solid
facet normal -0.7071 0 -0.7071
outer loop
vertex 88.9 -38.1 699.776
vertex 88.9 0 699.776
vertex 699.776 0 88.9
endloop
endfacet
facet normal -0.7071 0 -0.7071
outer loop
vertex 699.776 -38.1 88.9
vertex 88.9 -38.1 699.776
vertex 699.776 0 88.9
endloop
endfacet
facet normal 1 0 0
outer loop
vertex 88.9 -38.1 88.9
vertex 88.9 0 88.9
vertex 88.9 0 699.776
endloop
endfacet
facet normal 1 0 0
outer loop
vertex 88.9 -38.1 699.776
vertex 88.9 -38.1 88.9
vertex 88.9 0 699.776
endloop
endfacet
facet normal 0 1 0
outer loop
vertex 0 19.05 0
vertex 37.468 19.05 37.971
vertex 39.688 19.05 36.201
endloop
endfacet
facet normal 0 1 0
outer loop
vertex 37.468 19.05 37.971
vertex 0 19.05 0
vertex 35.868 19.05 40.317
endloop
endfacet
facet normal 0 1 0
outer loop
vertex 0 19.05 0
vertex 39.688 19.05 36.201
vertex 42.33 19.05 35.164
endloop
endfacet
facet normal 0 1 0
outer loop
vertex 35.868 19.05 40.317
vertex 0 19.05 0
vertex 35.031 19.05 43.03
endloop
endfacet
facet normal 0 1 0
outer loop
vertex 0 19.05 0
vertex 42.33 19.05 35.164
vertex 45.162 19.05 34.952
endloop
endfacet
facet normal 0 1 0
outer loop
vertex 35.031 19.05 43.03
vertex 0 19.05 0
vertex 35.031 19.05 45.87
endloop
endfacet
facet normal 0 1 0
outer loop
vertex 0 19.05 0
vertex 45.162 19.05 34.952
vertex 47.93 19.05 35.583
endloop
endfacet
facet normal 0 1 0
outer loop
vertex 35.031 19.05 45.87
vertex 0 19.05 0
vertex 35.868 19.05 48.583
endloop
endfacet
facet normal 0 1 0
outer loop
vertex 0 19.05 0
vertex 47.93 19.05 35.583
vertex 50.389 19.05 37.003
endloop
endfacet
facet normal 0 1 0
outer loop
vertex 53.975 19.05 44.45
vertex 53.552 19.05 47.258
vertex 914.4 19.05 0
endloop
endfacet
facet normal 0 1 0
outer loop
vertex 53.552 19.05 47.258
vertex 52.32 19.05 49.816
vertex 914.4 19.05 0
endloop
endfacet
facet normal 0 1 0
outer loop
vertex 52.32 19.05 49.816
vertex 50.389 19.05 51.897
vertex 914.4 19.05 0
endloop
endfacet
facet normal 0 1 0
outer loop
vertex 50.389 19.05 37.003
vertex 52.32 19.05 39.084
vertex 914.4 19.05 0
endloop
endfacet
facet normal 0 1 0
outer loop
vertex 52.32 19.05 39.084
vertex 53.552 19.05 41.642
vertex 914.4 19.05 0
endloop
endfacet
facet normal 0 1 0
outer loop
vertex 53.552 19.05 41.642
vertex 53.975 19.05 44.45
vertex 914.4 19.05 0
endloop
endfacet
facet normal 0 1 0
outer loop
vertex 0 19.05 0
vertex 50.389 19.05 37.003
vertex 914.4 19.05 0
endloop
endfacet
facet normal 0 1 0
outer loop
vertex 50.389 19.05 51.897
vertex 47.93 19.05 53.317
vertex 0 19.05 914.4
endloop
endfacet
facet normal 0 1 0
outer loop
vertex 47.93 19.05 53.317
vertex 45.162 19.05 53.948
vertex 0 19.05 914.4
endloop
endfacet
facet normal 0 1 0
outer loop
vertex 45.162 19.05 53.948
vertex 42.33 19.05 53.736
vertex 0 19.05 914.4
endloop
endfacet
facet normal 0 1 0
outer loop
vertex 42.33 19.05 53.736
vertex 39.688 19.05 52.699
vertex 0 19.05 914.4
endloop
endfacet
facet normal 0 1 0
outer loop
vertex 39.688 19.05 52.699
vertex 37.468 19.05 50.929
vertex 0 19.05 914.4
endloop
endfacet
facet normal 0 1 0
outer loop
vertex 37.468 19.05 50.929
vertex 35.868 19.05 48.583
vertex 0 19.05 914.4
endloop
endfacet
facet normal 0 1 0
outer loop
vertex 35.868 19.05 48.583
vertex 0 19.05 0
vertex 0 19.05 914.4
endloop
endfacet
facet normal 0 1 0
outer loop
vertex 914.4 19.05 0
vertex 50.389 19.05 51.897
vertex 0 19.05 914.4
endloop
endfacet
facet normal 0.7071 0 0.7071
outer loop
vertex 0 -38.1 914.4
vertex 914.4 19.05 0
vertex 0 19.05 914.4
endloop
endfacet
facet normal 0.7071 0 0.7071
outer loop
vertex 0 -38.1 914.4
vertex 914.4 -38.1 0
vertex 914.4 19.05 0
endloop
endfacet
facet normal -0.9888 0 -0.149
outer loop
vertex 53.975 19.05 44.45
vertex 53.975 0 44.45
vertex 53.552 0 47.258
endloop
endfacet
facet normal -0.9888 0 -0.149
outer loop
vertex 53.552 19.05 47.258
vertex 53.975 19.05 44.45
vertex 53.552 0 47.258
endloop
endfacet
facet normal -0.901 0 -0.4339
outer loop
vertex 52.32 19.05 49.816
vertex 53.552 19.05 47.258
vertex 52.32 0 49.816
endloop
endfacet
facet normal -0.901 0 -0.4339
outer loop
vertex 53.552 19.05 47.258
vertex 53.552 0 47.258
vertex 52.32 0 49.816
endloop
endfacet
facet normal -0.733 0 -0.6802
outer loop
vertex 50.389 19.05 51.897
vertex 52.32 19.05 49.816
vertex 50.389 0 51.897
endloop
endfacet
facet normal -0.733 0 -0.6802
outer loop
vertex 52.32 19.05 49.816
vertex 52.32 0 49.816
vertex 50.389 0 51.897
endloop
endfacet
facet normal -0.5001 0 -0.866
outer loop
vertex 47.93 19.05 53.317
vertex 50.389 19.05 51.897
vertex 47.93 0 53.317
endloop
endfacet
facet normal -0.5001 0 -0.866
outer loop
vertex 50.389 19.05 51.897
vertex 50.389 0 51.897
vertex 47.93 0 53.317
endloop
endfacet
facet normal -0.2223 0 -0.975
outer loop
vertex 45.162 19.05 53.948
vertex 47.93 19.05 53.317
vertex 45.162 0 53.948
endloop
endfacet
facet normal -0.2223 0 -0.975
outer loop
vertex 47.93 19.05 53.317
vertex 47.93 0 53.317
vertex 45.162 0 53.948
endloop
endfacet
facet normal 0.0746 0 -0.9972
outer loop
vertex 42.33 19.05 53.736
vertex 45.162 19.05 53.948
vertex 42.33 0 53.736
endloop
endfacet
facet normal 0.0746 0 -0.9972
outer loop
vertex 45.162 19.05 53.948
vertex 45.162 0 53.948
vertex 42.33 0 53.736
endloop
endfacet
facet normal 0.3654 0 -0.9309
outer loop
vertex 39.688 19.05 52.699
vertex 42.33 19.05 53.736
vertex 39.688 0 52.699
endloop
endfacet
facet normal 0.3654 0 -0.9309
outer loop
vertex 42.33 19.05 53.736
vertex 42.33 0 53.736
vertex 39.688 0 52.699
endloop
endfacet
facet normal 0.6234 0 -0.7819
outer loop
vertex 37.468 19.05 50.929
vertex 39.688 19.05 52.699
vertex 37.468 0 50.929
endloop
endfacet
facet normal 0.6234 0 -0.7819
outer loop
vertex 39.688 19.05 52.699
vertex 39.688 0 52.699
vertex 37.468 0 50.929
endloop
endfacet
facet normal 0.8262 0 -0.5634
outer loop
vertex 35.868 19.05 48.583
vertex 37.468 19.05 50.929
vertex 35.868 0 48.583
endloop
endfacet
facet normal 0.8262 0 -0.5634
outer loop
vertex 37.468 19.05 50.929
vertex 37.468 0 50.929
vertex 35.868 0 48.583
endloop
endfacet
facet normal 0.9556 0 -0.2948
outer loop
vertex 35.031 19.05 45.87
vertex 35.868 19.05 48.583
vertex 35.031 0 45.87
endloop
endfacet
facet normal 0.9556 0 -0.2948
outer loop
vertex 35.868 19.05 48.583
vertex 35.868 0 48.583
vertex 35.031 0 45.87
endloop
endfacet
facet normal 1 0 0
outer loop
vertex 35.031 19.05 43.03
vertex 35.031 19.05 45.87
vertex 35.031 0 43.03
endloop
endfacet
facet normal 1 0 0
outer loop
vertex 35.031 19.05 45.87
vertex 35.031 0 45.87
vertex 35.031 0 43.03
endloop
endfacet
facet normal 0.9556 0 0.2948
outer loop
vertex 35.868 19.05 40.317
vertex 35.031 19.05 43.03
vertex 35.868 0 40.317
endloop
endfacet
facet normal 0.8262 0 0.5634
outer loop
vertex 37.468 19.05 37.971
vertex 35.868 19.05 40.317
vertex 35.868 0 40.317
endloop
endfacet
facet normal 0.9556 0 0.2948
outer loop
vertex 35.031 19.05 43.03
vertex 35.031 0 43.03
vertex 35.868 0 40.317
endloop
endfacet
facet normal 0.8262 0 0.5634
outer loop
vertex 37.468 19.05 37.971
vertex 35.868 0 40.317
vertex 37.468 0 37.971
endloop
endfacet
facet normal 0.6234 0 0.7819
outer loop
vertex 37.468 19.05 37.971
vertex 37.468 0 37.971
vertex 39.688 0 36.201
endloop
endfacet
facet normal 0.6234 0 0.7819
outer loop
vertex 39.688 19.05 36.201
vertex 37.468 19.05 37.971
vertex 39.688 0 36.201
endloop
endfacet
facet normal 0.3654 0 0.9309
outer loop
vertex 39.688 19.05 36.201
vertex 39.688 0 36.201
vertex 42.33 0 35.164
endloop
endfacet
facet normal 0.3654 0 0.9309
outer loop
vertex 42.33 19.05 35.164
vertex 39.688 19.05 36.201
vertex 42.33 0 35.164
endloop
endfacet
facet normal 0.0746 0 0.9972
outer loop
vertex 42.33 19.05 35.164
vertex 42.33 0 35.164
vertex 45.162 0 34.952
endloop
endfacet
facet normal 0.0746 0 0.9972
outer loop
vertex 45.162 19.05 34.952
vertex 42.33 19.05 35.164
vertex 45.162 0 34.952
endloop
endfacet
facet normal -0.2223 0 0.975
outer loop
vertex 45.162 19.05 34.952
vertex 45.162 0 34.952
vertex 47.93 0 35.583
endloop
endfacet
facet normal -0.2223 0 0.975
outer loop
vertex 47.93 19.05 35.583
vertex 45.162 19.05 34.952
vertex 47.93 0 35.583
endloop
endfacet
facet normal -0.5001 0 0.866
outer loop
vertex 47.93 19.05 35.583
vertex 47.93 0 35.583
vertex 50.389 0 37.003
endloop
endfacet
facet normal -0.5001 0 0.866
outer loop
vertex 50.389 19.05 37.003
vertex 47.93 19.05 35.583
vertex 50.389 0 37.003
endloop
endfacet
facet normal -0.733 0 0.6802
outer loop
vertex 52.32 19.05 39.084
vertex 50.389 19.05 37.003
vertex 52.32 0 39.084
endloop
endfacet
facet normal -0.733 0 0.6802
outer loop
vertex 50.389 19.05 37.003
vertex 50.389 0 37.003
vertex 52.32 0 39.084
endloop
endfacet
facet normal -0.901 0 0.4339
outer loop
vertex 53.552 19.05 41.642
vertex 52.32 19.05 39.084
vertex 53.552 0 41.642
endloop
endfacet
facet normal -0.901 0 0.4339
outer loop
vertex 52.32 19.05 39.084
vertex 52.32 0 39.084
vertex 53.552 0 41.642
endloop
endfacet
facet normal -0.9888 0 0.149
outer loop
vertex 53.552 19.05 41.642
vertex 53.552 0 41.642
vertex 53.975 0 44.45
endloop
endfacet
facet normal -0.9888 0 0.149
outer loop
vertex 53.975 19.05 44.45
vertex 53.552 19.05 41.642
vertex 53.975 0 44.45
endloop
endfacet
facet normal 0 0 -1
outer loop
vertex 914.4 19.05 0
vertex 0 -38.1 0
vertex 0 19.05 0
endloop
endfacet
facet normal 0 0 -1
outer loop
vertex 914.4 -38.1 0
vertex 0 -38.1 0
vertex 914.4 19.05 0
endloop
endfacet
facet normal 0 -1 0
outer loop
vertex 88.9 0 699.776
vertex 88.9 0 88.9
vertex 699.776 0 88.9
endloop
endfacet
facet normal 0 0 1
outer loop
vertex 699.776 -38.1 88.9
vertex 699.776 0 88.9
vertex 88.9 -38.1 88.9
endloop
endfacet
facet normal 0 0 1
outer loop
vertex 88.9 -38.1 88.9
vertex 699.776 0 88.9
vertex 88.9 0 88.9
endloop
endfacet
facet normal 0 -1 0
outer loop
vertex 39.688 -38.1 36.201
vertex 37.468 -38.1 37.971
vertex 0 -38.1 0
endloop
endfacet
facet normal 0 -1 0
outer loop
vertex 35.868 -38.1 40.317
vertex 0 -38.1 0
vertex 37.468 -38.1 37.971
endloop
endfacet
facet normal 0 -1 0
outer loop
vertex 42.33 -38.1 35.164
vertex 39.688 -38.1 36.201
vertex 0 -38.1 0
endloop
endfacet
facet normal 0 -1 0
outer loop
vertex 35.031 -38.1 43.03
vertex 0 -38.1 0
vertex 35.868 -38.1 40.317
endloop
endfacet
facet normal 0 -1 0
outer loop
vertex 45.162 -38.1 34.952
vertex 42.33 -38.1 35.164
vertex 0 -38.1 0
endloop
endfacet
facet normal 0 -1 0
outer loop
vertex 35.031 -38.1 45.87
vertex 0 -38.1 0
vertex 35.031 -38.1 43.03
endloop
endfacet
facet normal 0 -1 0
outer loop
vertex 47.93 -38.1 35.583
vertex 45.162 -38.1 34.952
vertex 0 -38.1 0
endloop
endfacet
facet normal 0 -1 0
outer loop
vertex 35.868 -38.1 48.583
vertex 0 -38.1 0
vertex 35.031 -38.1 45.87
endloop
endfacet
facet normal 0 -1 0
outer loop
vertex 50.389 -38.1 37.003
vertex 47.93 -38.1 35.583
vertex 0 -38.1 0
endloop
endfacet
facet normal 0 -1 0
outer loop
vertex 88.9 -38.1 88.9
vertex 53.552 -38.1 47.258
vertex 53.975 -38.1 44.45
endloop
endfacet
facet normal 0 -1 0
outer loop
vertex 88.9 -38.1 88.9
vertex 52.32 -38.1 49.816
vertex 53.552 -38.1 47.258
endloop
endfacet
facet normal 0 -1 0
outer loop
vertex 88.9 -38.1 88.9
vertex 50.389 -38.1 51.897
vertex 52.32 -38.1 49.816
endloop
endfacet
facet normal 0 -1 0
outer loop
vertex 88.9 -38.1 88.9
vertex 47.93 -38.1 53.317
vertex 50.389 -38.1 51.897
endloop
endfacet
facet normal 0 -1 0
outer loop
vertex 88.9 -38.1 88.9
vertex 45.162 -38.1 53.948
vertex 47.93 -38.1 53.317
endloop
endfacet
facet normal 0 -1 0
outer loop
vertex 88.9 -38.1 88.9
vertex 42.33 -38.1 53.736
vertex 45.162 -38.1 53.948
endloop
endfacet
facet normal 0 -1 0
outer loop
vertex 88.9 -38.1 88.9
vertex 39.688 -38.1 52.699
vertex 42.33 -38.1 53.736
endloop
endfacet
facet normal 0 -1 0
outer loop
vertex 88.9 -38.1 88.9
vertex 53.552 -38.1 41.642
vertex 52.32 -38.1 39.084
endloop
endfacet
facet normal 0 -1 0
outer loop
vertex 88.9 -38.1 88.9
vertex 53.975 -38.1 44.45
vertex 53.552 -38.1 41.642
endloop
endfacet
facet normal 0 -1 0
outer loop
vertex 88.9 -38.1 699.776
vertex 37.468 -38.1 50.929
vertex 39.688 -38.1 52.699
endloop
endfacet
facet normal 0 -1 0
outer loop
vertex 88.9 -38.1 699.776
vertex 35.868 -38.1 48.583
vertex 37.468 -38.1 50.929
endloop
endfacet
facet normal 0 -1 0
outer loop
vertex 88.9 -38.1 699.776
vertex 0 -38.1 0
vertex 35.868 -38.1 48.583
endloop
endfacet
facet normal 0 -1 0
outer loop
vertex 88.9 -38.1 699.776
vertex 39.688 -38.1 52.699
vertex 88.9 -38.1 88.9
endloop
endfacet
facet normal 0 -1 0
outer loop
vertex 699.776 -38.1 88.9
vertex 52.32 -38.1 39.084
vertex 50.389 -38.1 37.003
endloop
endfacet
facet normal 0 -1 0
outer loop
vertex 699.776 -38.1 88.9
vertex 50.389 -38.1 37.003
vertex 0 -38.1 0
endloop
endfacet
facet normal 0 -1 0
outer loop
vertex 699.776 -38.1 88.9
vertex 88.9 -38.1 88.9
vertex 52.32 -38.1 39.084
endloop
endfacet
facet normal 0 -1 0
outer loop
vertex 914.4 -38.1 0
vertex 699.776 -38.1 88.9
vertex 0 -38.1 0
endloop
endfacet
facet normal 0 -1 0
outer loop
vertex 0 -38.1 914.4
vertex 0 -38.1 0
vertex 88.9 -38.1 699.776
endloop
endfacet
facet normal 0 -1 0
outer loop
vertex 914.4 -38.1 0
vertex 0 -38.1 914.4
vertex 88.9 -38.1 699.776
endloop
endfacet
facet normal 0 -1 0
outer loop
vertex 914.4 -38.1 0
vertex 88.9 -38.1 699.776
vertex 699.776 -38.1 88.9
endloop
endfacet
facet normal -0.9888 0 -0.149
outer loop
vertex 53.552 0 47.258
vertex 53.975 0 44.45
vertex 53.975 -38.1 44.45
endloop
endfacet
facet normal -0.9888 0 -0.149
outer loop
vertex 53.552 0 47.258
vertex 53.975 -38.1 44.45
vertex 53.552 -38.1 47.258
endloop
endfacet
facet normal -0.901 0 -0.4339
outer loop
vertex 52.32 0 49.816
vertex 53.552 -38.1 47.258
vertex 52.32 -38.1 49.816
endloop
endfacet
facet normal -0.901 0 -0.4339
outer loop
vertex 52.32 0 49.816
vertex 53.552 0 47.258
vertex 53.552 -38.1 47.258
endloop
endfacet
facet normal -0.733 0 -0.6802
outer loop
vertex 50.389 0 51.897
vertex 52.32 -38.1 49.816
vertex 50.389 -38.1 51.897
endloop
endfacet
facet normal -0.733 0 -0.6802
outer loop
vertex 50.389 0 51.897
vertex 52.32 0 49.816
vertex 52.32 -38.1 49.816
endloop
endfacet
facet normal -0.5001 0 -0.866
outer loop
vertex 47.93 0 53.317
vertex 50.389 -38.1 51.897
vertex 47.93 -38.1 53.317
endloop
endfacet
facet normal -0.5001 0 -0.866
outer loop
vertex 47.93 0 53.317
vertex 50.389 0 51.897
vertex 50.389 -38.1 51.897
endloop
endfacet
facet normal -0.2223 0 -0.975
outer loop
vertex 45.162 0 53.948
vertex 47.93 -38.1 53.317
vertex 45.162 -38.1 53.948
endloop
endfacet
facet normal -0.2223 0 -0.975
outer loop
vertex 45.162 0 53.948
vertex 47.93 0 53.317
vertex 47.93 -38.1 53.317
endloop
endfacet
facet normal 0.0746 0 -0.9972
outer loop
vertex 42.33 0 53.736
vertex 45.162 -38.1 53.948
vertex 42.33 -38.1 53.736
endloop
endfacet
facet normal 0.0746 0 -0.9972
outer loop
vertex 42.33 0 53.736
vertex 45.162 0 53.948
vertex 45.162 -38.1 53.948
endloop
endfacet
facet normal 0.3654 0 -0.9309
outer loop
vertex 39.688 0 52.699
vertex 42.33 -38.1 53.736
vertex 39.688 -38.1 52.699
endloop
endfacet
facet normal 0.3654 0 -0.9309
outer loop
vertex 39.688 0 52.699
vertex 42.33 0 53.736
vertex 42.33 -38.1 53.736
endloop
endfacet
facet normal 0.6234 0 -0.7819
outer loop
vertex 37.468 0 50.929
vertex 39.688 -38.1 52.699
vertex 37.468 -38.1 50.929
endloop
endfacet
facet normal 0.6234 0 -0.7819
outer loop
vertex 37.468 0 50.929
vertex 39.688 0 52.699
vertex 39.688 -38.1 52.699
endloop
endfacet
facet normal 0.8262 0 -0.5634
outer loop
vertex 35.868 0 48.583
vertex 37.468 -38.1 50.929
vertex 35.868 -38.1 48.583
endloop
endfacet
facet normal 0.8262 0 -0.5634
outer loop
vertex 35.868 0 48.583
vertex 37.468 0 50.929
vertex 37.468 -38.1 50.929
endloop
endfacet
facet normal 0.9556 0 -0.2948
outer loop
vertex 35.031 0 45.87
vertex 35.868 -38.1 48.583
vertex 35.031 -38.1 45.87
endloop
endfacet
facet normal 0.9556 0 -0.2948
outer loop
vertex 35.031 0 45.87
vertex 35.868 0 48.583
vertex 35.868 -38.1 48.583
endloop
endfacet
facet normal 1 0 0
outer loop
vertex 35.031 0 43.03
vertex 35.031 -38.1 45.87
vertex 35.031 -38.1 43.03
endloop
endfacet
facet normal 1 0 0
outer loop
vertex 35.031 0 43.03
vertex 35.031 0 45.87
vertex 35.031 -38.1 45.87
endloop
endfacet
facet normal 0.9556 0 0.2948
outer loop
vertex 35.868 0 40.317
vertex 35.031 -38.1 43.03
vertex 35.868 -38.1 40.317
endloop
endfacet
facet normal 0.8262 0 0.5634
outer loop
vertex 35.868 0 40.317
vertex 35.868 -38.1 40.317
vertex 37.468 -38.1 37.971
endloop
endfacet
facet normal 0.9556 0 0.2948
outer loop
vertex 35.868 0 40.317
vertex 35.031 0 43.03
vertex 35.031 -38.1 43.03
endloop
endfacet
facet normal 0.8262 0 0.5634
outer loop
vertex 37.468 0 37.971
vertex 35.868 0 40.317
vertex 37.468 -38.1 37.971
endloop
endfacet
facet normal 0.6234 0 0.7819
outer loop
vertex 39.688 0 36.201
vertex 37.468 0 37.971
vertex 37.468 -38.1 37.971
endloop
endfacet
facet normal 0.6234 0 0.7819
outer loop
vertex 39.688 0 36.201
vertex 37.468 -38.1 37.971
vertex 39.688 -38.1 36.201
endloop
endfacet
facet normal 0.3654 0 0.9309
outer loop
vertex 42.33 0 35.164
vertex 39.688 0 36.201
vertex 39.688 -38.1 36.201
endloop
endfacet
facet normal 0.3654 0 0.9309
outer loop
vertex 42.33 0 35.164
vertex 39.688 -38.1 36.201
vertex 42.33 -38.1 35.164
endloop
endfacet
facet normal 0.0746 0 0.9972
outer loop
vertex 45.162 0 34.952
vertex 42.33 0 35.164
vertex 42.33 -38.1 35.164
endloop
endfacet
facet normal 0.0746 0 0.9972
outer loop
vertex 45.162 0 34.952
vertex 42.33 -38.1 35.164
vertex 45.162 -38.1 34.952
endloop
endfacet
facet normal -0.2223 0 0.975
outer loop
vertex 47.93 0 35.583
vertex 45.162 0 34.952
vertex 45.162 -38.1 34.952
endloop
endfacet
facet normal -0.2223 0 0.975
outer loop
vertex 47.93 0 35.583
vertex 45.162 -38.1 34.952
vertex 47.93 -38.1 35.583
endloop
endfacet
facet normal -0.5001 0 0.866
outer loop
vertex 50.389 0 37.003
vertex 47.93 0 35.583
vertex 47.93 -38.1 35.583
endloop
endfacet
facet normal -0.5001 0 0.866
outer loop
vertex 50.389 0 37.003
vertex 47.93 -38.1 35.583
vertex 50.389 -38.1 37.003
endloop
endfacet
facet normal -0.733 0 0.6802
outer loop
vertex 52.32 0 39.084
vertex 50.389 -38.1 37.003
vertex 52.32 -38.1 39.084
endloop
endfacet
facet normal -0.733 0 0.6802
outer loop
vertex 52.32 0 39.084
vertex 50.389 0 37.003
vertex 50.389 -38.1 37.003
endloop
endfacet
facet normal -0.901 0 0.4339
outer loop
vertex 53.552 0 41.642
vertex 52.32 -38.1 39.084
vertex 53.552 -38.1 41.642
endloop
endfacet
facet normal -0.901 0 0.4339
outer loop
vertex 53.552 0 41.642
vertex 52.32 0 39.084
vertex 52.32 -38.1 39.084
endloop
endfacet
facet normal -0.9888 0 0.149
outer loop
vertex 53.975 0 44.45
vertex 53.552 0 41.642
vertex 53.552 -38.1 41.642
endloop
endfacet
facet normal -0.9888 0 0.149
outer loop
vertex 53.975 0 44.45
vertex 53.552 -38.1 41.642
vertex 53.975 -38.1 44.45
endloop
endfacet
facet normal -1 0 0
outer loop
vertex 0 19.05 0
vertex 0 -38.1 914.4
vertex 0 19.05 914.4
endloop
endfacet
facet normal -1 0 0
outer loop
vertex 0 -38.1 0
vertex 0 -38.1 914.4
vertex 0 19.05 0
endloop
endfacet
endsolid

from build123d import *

# Parameters (mm, degrees)
F0_R     = 9.525
F1_DEPTH = 38.1
F2_DEPTH = 19.05


with BuildPart() as f1:
    # F0 (on Front) → F1 (new body)
    with BuildSketch(Plane.XZ):
        Polygon((914.4, 0), (0, 914.4), (0, 0), align=None)
        with Locations((44.45, 44.45)):
            Circle(F0_R, mode=Mode.SUBTRACT)
        Polygon((699.776414305, 88.9), (88.9, 88.9), (88.9, 699.776414305), align=None, mode=Mode.SUBTRACT)
    extrude(amount=F1_DEPTH)

    # F0 (on Front) → F2 (join)
    with BuildSketch(Plane.XZ):
        Polygon((914.4, 0), (0, 914.4), (0, 0), align=None)
        with Locations((44.45, 44.45)):
            Circle(F0_R, mode=Mode.SUBTRACT)
        Polygon((699.776414305, 88.9), (88.9, 88.9), (88.9, 699.776414305), align=None, mode=Mode.SUBTRACT)
        Polygon((88.9, 699.776414305), (88.9, 88.9), (699.776414305, 88.9), align=None)
    extrude(amount=-F2_DEPTH)


solid = f1.part
